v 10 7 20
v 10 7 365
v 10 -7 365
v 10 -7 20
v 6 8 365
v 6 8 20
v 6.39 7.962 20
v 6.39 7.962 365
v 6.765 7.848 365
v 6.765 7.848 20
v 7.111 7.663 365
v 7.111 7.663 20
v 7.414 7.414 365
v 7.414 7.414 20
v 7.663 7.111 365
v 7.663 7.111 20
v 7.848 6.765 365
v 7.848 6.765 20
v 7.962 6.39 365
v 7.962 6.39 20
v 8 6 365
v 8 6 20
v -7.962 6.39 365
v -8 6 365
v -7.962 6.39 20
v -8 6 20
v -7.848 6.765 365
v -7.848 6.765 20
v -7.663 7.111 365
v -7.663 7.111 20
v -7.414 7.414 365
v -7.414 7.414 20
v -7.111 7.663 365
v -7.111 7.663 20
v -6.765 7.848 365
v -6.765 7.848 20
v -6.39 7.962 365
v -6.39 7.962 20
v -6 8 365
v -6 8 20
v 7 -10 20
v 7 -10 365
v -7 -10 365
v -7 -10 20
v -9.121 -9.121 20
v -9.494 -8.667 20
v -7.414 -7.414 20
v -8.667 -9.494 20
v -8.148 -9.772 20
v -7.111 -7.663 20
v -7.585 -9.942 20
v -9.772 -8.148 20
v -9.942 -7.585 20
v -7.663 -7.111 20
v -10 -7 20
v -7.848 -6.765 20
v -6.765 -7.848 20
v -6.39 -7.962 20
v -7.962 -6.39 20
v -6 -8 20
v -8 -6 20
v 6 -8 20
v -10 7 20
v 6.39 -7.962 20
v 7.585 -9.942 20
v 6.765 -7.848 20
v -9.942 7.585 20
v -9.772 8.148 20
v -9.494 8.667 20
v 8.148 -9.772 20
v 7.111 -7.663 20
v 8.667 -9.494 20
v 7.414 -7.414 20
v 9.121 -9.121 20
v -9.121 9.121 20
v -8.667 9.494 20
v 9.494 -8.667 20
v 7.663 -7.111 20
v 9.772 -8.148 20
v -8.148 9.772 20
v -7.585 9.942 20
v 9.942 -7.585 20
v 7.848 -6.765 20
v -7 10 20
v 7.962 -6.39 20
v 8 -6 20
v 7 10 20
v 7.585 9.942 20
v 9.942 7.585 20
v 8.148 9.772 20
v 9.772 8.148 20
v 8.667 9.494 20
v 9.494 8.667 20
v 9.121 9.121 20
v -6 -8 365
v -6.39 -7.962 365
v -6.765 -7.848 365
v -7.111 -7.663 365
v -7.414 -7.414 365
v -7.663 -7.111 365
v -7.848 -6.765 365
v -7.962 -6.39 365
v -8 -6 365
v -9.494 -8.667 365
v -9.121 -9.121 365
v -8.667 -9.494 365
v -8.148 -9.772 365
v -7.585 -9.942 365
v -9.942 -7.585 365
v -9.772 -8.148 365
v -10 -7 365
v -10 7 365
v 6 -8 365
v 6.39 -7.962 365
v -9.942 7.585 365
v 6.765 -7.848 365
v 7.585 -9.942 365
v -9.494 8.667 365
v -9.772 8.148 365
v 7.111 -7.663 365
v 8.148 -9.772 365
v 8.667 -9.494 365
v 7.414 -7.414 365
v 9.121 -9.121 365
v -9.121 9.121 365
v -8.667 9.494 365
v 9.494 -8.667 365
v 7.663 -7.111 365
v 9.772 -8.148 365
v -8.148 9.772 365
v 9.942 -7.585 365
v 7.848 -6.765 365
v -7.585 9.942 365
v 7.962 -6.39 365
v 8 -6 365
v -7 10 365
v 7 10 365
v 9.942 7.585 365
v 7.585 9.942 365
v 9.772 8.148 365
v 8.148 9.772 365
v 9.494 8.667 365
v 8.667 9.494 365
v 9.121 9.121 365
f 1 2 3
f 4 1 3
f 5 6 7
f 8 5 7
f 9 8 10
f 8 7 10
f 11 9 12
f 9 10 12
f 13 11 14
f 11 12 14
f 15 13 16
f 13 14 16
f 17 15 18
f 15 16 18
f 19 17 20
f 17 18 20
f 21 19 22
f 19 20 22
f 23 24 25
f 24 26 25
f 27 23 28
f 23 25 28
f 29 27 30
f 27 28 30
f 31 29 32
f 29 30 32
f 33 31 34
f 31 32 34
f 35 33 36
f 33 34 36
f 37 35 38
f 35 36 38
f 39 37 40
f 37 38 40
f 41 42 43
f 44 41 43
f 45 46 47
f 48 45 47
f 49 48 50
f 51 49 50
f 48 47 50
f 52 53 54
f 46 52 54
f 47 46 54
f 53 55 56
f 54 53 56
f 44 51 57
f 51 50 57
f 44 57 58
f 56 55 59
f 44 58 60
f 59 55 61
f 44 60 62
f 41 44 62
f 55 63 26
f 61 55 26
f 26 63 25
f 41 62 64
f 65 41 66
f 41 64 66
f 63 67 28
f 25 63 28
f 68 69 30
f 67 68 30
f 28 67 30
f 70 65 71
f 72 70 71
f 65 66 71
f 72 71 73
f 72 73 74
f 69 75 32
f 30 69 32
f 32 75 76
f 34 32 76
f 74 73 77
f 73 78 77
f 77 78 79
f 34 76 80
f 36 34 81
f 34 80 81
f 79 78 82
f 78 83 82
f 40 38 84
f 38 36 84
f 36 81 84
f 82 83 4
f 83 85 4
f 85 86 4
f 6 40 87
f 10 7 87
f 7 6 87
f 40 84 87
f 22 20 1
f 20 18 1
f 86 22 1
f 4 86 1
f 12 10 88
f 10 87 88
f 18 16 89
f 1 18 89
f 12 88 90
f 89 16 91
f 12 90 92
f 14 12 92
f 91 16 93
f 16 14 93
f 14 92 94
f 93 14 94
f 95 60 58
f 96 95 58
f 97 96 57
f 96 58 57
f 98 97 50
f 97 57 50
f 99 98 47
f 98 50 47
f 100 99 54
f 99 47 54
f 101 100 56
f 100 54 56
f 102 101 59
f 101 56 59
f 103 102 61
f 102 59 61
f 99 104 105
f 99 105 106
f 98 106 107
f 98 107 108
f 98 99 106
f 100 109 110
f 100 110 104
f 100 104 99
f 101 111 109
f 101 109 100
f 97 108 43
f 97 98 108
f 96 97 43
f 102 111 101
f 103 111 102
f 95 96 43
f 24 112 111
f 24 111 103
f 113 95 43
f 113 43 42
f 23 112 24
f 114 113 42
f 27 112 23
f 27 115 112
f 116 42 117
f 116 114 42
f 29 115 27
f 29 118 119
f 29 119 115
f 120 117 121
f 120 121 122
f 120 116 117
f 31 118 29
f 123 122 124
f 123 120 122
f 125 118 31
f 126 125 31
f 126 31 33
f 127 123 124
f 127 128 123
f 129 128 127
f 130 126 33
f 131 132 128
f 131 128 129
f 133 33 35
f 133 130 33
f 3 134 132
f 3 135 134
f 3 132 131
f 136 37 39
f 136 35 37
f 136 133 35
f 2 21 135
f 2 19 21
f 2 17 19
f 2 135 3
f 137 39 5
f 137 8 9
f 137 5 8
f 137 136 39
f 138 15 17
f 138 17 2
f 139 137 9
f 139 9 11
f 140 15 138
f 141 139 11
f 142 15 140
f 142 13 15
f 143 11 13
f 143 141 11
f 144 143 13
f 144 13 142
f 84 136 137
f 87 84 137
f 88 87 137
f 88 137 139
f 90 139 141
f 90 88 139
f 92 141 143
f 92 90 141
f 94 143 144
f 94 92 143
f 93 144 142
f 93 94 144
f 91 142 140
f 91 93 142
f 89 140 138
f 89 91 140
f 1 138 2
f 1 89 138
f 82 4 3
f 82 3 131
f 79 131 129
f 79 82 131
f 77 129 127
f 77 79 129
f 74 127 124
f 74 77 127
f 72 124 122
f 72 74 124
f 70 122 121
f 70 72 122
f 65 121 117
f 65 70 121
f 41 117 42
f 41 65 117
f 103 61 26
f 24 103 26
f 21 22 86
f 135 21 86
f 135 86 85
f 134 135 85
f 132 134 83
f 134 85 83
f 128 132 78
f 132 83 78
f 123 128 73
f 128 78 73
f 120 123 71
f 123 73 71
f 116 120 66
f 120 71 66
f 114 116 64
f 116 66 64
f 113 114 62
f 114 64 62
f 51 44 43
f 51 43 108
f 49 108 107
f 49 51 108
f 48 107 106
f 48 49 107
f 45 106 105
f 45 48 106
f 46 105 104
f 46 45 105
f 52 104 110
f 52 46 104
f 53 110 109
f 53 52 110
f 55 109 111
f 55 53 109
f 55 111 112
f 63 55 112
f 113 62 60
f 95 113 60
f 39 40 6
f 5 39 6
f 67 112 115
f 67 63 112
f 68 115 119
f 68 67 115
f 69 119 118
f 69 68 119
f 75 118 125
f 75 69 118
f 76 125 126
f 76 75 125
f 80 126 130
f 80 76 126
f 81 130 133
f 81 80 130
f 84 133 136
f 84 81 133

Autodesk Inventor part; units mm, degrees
ref_plane "Start Plane" through (0, 0, 20) normal (0, 0, 1) x (1, 0, 0)
ref_plane "End Plane" through (0, 0, 365) normal (0, 0, 1) x (1, 0, 0)
sketch "Sketch" plane through (0, 0, 0) normal (0, 0, 1) x (1, 0, 0)
  line L0 (-10, -7) -> (-10, 7)
  line L1 (-7, 10) -> (7, 10)
  line L2 (10, 7) -> (10, -7)
  line L3 (7, -10) -> (-7, -10)
  arc A0 (-10, -7) -> (-7, -10) centre (-7, -7) ccw
  arc A1 (-7, 10) -> (-10, 7) centre (-7, 7) ccw
  arc A2 (10, 7) -> (7, 10) centre (7, 7) ccw
  arc A3 (7, -10) -> (10, -7) centre (7, -7) ccw
  line L4 (-6, 8) -> (6, 8)
  line L5 (8, 6) -> (8, -6)
  line L6 (6, -8) -> (-6, -8)
  line L7 (-8, -6) -> (-8, 6)
  line L8 (0, 14.8698) -> (0, -14.8698) construction
  line L9 (-14.8698, 0) -> (14.8698, 0) construction
  arc A4 (-8, -6) -> (-6, -8) centre (-6, -6) ccw
  arc A5 (-6, 8) -> (-8, 6) centre (-6, 6) ccw
  arc A6 (8, 6) -> (6, 8) centre (6, 6) ccw
  arc A7 (6, -8) -> (8, -6) centre (6, -6) ccw
  dimension "d7" = 3
  dimension "d10" = 20
  dimension "d11" = 20
  dimension "d12" = 2
  dimension "d15" = 10
  dimension "d16" = 10
  dimension "d19" = 2
  dimension "d20" = 2
extrude "Body" add sketch "Sketch" along normal up to surface (345 mm away) from surface at 20
sketch "Sketch3" plane through (0, 0, 0) normal (0, 0, 1) x (1, 0, 0)
  line L0 (0, 0) -> (10, 0)
ref_plane "Work Plane3" through (0, 0, 0) normal (0, -1, 0) x (1, 0, 0)
ref_plane "Work Plane4" through (162.5, -7, 365) normal (0, 0, 1) x (1, 0, 0)
split "Split1" plane through (162.5, -7, 365) removes the side toward (0, 0, 1)
ref_plane "Work Plane5" through (-162.5, -7, 20) normal (0, 0, -1) x (-1, 0, 0)
split "Split2" plane through (-162.5, -7, 20) removes the side toward (0, 0, -1)
sketch "Sketch4" plane through (0, 0, 0) normal (0, -1, 0) x (1, 0, 0)
  line L0 (-2, 20) -> (12, 20) projected
  line L1 (-2, 365) -> (12, 365) projected
  dimension "d18" = 345
equation "\"d7\" = G_IR"
equation "\"d10\" = G_H"
equation "\"d11\" = G_W"
equation "\"d12\" = G_T"
equation "\"d15\" = 0.5 * d10"
equation "\"d16\" = 0.5 * d11"
equation "\"d19\" = G_T"
equation "\"d20\" = G_T"
equation "\"d3\" = G_L"
equation "\"G_W\" = 20"
equation "\"G_H\" = 20"
equation "\"G_T\" = 2"
equation "\"G_IR\" = 3"
equation "\"G_L\" = d18"
equation "\"d14\" = G_OFFSET_END + B_L"
equation "\"B_L\" = 385"
equation "\"G_OFFSET_END\" = -20"
properties part number "DIN EN 10210-2 - 20 x 20 x 2 - 345" material "Steel, Mild"
